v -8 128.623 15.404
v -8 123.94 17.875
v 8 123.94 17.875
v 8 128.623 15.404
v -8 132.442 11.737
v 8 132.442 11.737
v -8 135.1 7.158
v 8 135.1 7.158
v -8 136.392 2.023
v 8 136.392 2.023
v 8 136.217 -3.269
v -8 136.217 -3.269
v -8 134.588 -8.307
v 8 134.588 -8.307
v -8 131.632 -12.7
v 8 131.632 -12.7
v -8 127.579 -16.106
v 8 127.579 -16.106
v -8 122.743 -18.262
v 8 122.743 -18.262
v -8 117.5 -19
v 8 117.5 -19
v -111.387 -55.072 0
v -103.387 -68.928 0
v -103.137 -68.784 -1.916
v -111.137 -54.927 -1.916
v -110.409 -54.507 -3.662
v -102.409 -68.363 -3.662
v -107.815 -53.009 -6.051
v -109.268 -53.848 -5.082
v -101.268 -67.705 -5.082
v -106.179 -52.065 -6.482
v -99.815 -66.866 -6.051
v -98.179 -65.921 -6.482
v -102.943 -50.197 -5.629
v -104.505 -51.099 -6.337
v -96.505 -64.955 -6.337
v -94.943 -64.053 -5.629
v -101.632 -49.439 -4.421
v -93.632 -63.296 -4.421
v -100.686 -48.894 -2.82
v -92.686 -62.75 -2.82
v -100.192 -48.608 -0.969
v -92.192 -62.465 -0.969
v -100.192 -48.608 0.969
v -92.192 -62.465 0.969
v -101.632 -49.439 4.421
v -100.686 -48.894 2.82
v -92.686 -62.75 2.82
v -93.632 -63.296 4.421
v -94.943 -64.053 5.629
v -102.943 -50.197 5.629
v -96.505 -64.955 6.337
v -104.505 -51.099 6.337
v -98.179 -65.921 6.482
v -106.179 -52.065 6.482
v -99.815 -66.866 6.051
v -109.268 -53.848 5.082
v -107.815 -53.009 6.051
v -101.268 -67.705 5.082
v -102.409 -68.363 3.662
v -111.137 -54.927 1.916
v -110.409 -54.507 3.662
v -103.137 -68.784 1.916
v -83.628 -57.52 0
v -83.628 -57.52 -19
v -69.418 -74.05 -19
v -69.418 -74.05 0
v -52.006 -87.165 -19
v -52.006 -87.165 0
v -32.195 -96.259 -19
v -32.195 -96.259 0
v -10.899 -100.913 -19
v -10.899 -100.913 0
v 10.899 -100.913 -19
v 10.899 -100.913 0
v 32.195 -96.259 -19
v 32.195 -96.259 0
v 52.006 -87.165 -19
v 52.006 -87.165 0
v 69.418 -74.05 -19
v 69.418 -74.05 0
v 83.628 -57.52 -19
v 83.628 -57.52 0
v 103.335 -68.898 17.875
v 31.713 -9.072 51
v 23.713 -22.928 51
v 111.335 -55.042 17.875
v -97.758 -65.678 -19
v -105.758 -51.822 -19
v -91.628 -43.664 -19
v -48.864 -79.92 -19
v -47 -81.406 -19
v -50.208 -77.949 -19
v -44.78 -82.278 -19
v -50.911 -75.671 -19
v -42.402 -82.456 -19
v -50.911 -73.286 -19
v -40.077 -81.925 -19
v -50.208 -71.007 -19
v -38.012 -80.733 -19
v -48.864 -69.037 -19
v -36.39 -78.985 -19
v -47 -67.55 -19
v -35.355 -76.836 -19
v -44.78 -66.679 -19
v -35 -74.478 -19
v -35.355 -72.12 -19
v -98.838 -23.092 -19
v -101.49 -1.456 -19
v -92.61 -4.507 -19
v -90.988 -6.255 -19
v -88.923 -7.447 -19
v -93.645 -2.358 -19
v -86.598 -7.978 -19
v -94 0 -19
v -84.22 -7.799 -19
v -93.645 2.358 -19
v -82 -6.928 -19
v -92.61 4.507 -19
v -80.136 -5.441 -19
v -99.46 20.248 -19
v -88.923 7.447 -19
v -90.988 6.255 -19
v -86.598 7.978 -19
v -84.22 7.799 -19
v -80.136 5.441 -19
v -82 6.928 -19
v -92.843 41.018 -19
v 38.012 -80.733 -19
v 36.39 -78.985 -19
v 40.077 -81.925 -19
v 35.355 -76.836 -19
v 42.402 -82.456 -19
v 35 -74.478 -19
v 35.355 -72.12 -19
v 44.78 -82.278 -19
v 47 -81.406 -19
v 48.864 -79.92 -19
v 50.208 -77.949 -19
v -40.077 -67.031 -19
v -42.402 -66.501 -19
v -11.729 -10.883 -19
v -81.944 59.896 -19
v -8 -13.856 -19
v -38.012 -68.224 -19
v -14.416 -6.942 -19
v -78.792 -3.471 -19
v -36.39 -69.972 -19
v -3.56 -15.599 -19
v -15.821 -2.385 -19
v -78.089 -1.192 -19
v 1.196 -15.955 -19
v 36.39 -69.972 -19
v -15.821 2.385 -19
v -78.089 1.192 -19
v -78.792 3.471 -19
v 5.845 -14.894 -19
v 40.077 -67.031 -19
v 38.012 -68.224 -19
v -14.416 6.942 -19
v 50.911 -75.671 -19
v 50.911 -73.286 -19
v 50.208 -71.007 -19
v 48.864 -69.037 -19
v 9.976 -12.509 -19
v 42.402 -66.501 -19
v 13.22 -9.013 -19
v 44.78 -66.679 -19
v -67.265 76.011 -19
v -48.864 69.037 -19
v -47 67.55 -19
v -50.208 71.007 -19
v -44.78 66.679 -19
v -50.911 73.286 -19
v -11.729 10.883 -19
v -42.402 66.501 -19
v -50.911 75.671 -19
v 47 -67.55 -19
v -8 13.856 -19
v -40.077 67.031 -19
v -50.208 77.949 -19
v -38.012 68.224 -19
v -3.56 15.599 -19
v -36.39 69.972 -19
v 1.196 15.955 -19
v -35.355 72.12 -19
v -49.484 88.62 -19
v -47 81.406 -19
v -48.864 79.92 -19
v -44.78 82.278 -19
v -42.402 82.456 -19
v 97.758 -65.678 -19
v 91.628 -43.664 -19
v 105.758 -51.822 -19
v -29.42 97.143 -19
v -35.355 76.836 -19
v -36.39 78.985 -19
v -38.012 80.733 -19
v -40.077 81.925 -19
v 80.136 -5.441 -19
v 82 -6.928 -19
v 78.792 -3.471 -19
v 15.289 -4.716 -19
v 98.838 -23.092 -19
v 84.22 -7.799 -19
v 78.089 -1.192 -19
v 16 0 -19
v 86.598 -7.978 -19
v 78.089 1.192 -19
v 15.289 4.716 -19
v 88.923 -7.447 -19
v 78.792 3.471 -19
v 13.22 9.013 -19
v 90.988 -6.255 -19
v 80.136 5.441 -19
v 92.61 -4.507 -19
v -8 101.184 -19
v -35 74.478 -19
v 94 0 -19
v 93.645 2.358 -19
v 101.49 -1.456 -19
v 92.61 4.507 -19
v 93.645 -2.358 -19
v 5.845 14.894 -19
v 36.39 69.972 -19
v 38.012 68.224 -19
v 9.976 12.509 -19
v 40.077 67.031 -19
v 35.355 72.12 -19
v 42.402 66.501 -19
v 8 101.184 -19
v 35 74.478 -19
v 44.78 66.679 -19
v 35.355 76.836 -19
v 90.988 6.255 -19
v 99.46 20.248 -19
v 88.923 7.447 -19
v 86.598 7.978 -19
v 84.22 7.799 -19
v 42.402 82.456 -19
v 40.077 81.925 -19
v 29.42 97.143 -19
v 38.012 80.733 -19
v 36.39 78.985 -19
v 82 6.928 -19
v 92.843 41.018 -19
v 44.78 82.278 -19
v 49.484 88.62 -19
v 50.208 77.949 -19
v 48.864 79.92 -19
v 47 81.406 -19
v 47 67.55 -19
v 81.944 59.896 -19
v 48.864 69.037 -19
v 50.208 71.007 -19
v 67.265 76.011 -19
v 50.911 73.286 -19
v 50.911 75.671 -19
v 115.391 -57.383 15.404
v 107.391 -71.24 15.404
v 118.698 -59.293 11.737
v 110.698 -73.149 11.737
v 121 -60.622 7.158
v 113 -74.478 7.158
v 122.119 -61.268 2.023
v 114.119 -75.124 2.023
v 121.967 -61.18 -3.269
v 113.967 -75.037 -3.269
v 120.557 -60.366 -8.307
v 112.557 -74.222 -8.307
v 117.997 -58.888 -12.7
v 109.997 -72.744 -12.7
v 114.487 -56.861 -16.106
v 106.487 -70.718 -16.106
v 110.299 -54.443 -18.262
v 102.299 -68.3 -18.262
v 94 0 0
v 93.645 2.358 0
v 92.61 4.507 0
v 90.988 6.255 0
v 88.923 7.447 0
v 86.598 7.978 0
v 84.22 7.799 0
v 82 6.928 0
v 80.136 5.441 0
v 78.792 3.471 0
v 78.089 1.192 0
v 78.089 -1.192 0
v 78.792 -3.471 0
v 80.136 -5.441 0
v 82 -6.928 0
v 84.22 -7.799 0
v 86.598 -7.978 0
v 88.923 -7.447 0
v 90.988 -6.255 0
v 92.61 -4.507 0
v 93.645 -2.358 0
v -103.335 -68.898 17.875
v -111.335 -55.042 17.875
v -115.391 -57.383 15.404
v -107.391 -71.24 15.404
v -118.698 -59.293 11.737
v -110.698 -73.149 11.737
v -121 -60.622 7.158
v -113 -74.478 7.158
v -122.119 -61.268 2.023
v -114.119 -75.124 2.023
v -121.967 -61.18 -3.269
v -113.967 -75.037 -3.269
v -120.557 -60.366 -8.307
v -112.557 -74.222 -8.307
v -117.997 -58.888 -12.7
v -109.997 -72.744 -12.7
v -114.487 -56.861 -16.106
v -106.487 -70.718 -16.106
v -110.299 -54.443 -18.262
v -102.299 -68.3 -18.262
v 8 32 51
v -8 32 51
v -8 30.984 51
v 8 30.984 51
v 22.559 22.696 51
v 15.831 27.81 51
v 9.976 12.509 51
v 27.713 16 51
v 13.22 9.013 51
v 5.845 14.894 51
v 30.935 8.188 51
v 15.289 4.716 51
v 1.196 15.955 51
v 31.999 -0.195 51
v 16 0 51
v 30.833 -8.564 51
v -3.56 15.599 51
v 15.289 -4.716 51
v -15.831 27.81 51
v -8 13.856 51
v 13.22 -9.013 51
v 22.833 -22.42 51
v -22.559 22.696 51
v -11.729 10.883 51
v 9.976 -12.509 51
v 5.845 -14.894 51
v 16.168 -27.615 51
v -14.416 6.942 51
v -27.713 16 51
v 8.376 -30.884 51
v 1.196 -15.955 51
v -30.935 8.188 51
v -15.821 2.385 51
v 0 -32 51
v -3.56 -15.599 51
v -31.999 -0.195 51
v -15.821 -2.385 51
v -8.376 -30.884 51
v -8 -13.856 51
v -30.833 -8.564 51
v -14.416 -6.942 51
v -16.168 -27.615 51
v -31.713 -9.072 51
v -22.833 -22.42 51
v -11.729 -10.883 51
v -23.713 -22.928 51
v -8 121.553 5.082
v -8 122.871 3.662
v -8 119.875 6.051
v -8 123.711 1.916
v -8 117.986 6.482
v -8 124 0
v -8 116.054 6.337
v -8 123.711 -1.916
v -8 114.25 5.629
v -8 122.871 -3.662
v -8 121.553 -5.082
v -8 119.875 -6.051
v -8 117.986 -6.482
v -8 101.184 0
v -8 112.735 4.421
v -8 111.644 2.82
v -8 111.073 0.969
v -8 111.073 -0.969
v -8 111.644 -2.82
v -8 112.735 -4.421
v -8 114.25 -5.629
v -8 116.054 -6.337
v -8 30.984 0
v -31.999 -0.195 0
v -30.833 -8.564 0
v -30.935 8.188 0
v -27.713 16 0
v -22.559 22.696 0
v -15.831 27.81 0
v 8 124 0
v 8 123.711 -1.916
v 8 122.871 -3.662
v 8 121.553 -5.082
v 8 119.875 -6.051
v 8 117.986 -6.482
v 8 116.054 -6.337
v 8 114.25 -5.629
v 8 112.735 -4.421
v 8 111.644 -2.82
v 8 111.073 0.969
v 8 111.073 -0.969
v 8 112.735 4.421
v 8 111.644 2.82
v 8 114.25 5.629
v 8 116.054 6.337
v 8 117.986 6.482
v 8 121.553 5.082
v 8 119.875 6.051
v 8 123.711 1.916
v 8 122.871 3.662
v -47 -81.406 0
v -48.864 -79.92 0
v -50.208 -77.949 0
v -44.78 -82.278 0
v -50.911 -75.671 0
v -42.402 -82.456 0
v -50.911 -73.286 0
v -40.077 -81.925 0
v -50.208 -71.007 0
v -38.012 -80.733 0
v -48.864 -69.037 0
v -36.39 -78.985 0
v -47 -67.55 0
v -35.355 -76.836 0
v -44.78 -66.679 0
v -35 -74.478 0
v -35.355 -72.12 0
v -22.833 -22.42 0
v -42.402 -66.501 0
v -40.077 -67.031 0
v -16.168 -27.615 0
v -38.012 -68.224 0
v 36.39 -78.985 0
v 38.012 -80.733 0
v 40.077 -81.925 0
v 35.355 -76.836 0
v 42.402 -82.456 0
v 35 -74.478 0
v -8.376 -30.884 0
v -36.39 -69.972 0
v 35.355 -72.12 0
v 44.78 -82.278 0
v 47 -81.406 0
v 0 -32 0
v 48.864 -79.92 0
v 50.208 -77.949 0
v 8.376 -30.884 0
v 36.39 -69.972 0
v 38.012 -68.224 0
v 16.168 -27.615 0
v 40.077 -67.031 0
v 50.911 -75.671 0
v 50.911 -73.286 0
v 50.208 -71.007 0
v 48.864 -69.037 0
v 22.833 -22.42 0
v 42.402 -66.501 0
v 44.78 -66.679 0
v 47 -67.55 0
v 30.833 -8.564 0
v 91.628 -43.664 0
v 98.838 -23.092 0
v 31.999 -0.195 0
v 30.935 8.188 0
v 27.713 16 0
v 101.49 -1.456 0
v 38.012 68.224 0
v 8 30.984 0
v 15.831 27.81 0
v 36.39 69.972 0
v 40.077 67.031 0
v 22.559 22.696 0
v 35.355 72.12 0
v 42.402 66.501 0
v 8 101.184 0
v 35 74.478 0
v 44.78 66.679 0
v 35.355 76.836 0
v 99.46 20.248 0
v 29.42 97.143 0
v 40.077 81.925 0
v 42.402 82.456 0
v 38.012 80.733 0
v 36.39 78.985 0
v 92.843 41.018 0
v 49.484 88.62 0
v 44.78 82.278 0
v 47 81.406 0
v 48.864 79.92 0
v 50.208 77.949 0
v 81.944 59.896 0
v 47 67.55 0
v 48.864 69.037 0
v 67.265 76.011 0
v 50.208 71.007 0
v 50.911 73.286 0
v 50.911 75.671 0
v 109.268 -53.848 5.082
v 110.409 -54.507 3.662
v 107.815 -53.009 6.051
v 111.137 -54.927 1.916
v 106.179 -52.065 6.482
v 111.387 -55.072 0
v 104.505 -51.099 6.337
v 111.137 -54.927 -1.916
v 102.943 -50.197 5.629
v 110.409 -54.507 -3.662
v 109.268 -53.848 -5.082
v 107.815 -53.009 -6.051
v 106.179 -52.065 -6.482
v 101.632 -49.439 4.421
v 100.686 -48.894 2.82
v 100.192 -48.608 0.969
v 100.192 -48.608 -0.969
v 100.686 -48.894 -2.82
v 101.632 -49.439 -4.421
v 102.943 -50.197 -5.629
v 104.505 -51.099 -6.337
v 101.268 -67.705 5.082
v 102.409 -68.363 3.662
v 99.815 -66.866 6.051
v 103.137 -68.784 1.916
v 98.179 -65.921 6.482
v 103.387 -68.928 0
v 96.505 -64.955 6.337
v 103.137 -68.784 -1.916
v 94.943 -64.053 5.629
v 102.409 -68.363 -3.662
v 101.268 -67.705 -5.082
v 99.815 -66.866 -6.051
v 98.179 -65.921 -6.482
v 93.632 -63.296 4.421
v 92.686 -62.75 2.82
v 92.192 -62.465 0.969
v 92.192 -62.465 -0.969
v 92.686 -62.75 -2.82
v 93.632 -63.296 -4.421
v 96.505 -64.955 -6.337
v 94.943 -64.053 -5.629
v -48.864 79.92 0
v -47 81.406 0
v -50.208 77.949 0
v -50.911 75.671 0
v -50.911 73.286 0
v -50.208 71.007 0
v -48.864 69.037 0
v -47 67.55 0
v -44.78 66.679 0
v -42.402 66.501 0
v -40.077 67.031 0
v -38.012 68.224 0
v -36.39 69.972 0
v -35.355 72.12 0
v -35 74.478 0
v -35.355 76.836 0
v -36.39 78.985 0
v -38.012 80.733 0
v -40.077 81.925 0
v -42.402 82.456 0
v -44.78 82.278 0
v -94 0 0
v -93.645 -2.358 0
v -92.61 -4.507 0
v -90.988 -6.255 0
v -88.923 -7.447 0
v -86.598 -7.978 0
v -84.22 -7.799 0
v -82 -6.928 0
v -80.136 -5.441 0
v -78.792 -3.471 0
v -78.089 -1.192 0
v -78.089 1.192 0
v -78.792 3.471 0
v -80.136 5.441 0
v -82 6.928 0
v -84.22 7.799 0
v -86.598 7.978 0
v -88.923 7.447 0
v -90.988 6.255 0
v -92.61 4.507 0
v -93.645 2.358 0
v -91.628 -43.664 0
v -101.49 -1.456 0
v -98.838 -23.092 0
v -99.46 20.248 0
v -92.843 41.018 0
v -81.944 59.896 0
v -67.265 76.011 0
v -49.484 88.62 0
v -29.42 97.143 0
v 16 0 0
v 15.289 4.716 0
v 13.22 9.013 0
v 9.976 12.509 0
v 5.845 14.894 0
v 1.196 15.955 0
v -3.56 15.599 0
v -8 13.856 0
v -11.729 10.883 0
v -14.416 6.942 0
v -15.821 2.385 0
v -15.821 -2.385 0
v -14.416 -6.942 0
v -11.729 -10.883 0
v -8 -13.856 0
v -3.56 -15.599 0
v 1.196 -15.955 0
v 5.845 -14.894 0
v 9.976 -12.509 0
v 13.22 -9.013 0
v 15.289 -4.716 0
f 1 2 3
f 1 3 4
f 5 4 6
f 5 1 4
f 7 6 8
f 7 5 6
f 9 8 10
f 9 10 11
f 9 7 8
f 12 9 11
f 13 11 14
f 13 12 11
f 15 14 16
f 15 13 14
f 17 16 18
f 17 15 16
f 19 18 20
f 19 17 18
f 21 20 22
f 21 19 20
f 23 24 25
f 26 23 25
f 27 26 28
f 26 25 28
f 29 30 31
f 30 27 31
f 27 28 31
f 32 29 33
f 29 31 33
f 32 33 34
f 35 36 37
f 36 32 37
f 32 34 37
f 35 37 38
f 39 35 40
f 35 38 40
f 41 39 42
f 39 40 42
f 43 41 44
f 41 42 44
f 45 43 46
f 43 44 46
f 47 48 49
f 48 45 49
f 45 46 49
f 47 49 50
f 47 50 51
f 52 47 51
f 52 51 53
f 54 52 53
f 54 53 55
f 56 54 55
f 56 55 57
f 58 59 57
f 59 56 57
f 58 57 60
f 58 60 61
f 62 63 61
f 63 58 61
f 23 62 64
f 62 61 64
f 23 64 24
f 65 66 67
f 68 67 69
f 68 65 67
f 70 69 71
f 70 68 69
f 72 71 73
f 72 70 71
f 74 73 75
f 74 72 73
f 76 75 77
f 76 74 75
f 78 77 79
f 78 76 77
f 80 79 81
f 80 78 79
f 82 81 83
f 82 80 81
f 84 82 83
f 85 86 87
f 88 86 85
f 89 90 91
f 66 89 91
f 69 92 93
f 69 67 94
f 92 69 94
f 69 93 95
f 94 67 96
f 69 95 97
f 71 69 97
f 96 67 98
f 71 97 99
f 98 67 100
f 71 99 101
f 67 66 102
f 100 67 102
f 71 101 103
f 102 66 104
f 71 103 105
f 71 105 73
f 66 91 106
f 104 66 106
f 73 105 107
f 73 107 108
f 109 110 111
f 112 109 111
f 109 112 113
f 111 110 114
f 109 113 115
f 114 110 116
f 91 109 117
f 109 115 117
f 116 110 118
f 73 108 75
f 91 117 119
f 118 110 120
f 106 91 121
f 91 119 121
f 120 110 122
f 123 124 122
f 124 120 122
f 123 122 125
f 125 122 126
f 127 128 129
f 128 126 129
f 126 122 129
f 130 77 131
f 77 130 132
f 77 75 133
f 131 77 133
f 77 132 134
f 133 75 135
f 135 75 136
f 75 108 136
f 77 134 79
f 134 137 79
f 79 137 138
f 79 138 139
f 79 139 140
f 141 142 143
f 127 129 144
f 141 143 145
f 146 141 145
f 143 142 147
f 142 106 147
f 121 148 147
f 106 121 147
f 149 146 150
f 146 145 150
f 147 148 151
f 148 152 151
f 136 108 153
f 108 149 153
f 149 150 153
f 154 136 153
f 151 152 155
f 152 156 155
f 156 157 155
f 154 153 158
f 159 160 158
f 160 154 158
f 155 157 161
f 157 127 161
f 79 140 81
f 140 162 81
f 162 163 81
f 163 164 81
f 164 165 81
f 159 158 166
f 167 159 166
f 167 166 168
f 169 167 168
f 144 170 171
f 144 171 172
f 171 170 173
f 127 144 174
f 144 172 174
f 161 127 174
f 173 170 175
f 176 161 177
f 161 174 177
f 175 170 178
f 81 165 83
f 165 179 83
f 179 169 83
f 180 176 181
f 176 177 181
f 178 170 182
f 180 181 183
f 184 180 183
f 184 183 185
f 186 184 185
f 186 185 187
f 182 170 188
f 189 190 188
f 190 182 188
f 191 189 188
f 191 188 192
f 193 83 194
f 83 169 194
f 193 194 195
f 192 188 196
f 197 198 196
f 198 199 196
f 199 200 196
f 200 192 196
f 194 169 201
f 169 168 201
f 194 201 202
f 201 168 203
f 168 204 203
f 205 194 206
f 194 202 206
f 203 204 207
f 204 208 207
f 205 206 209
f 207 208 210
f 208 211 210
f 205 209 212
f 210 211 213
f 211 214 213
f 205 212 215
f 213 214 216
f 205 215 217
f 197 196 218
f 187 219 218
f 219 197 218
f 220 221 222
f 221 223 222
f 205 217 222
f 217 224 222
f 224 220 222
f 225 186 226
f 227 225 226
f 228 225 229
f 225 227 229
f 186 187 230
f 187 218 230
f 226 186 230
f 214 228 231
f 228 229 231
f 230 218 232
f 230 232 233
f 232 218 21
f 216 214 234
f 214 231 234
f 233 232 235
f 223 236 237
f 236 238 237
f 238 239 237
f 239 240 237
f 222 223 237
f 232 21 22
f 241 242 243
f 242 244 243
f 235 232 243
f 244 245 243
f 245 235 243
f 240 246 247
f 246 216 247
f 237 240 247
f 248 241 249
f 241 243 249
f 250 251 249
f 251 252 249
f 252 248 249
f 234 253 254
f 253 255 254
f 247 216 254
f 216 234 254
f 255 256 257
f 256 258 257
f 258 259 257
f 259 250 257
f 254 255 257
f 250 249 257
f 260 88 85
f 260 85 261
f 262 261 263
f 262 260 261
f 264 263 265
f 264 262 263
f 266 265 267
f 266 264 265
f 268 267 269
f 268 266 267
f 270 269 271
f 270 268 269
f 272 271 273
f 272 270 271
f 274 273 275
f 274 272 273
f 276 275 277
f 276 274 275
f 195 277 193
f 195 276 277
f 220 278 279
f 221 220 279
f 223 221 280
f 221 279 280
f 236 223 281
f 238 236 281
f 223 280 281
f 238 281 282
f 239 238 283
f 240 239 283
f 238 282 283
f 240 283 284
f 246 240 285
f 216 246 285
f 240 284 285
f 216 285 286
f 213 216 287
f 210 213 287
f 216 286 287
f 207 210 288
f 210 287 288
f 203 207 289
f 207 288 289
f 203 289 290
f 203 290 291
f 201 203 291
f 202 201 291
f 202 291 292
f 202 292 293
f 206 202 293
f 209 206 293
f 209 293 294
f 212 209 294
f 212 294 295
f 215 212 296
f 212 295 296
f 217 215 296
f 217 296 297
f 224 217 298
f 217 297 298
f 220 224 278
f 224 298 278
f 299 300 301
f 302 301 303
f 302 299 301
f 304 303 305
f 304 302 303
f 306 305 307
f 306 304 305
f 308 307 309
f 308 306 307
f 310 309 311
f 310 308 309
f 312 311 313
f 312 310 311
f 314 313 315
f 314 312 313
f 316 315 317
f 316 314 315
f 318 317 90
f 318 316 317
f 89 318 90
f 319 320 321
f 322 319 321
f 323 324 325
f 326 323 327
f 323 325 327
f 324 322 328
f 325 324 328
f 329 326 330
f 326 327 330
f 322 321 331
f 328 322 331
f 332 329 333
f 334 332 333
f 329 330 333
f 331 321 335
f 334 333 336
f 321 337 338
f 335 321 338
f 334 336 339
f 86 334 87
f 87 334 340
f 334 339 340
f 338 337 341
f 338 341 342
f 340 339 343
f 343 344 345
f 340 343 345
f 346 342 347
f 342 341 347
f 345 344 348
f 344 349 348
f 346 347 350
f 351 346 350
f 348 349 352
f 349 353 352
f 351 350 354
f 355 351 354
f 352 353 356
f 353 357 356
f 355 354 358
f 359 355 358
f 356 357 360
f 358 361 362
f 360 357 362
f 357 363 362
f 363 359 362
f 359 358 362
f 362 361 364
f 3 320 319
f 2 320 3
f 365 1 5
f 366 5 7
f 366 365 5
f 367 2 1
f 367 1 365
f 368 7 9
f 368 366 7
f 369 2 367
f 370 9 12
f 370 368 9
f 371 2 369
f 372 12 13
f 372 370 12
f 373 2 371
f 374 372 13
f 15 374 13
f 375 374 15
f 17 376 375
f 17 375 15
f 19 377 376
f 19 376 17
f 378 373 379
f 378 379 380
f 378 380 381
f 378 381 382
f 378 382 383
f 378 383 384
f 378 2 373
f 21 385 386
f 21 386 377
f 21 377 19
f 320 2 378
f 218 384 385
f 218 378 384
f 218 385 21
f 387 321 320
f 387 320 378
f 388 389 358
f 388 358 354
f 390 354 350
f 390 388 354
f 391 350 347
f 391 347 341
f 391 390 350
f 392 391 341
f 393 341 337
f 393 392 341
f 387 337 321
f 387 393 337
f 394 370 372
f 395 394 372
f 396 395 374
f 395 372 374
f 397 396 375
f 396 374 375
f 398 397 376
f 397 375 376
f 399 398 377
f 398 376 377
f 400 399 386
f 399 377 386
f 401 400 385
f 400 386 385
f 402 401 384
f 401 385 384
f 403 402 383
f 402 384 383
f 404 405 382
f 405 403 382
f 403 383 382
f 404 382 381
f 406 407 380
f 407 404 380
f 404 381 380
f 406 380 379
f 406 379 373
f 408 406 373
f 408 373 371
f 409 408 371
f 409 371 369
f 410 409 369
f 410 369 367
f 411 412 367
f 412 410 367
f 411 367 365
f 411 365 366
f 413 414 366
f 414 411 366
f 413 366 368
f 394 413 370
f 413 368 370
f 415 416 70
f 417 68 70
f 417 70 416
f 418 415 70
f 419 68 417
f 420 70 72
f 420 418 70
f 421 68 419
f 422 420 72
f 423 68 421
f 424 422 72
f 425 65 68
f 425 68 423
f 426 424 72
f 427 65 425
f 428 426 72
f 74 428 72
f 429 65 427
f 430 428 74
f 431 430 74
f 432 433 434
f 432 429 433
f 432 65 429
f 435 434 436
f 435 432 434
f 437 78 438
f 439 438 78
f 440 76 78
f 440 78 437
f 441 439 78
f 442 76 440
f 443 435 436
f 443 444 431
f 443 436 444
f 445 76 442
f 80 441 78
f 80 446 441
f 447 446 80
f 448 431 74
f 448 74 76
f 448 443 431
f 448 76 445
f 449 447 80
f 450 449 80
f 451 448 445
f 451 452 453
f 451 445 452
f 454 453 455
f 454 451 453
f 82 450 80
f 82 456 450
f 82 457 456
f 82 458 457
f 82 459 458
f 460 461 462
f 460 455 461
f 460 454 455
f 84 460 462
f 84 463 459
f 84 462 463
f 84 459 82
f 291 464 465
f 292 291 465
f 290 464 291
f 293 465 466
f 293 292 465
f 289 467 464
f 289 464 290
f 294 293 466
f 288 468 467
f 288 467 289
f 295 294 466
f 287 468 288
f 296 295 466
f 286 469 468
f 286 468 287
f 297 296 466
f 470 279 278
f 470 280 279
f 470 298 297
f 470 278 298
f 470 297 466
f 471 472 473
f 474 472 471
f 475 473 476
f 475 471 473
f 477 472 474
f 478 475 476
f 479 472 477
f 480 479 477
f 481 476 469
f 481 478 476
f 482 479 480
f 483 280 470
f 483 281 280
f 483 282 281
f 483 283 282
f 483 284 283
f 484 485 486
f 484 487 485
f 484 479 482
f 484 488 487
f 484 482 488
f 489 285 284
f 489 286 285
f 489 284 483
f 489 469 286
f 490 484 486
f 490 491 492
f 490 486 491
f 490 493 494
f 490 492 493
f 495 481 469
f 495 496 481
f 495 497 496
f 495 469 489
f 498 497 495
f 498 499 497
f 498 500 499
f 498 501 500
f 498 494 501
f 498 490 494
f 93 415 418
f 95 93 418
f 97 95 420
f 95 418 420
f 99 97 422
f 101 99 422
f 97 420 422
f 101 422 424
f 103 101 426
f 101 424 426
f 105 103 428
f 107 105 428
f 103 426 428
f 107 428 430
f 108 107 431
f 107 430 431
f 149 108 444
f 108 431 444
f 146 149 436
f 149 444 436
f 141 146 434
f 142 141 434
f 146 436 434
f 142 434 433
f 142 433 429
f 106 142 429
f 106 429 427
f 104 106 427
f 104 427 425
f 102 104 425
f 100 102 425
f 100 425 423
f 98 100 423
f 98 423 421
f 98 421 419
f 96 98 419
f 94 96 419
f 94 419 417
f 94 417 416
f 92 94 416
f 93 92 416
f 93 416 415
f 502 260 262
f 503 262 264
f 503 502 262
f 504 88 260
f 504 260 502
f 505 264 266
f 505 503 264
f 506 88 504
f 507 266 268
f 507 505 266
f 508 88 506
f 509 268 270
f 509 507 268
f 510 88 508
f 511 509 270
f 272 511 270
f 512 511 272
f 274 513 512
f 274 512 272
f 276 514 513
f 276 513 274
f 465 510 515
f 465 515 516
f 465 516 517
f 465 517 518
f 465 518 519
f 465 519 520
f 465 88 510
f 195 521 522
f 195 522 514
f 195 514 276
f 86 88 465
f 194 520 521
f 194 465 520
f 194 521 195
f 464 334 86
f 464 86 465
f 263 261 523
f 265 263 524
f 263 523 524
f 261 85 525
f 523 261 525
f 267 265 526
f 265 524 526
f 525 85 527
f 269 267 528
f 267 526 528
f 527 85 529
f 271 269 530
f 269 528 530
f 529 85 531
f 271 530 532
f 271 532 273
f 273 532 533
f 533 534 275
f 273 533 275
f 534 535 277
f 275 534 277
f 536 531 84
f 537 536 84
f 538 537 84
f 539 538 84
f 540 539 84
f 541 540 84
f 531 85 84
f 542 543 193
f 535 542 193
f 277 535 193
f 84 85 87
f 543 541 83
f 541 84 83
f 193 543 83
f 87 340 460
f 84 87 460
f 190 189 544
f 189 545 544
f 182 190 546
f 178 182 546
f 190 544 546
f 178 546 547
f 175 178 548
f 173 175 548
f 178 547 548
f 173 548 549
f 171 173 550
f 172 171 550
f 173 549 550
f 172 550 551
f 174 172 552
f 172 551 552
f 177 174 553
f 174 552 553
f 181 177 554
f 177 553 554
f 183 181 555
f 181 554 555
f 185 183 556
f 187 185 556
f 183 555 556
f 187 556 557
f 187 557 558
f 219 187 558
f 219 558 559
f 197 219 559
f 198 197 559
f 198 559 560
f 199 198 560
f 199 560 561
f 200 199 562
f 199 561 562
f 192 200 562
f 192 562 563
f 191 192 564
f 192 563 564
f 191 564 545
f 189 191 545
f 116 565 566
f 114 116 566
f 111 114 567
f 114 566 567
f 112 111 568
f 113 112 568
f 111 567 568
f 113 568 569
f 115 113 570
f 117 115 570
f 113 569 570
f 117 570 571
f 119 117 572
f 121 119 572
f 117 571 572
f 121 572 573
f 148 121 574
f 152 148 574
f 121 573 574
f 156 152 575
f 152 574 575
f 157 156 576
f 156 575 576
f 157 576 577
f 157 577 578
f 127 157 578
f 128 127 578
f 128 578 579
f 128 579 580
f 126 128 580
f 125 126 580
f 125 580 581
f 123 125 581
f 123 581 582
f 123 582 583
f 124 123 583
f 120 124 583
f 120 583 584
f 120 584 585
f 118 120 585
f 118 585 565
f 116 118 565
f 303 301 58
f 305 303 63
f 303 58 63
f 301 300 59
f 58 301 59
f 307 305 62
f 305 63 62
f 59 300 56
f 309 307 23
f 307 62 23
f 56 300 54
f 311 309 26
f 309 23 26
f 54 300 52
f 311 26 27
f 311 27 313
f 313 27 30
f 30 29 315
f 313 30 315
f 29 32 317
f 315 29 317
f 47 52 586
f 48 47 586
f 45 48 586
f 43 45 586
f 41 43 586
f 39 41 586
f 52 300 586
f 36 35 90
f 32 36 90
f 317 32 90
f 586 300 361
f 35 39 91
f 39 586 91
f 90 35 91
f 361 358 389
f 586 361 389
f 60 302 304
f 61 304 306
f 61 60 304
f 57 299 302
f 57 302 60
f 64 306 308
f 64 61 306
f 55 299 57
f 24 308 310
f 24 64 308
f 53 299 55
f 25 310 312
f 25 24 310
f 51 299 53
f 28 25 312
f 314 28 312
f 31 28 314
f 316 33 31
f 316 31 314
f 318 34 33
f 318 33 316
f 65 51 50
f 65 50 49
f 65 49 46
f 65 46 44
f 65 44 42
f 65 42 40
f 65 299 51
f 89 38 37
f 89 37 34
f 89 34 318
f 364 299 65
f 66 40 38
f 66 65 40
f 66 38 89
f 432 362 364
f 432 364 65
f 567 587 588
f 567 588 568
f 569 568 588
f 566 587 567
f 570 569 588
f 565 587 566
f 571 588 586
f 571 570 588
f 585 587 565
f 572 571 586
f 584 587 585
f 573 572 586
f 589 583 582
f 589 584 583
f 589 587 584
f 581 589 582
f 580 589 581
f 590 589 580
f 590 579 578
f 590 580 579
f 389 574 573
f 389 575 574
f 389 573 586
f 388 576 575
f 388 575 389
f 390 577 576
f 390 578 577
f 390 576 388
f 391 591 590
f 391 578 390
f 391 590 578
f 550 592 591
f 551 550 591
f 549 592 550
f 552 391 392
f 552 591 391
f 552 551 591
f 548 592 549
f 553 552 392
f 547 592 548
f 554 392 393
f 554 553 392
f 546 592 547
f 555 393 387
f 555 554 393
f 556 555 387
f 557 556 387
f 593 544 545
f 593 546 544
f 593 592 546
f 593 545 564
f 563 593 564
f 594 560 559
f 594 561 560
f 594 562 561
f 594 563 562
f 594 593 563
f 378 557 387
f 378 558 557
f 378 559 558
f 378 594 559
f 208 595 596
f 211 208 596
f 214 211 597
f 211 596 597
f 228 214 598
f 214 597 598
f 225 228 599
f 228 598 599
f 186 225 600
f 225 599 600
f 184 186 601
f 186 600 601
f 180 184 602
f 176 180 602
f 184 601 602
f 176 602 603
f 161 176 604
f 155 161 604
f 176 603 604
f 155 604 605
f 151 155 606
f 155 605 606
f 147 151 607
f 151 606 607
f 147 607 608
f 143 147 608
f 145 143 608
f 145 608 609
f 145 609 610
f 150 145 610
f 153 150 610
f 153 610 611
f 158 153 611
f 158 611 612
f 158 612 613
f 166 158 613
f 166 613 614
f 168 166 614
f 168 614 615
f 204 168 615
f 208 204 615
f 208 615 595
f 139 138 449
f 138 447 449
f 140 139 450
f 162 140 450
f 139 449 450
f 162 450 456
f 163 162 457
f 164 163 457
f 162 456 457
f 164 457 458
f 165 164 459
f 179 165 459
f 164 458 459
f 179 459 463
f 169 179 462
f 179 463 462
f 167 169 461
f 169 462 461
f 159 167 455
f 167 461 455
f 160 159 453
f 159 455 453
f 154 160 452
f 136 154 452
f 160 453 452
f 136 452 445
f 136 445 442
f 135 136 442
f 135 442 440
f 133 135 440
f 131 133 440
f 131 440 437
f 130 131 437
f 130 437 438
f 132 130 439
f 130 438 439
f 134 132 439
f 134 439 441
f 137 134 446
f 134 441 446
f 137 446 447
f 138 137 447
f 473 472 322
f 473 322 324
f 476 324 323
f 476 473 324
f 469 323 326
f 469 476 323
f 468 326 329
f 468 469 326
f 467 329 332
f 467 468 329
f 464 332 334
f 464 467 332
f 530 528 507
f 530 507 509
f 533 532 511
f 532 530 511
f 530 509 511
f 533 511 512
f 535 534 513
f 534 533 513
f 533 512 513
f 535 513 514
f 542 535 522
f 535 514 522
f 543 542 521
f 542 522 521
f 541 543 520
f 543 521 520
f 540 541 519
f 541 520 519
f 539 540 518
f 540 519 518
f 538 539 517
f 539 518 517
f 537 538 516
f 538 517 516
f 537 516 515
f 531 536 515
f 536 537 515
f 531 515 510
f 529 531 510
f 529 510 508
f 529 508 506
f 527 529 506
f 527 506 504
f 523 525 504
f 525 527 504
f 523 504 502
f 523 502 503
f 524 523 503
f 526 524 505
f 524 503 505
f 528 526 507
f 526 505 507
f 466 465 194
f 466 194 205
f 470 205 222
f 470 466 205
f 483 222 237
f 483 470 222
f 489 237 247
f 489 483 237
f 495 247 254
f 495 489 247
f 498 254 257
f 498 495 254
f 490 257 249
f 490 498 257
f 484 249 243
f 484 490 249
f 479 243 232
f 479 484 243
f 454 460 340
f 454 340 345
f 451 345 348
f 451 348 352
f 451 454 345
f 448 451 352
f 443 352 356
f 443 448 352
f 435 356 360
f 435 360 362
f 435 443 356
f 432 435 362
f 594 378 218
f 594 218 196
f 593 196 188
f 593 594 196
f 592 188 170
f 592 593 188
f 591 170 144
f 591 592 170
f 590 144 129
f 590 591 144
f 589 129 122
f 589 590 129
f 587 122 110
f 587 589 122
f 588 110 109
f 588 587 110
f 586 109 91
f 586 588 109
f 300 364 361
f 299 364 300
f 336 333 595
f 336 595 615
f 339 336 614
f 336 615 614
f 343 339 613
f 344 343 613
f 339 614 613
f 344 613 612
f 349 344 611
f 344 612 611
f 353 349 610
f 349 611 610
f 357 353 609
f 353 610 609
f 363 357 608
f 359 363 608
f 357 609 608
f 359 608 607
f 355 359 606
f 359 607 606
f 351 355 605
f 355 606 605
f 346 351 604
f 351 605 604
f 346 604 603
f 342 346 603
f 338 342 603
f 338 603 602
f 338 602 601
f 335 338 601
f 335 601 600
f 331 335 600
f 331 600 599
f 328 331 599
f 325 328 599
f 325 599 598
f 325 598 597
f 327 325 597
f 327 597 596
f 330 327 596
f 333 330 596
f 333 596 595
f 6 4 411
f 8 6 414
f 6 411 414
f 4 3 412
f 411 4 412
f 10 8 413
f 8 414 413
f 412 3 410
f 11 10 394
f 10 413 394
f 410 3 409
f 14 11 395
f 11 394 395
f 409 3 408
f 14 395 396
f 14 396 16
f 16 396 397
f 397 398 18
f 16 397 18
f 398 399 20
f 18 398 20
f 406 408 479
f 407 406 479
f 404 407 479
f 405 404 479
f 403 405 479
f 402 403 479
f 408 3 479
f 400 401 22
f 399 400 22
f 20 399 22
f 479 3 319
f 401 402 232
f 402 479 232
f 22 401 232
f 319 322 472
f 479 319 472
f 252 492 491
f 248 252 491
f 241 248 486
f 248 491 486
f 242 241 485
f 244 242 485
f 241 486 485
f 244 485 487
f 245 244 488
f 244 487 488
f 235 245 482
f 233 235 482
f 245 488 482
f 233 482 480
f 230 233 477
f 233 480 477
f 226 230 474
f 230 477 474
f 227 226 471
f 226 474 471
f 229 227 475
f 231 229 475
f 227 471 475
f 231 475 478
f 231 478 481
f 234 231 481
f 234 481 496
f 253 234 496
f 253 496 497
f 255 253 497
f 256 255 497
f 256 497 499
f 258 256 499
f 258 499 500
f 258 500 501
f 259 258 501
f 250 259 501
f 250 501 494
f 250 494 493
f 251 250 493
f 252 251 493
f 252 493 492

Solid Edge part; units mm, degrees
sketch "Sketch1" plane through (0, 0, 0) normal (0, 0, 1) x (1, 0, 0)
  circle A0 centre (0, 0) radius 101.5
extrude "Protrusion1" add sketch "Sketch1" against normal blind 19
sketch "Sketch2" plane through (0, 0, 0) normal (0, 0, 1) x (1, 0, 0)
  circle A0 centre (0, 0) radius 32
  circle A1 centre (0, 0) radius 16
extrude "ExtrudedProtrusion_2" add sketch "Sketch2" along normal blind 51
sketch "Sketch3" plane through (0, 0, 0) normal (0, 0, 1) x (1, 0, 0)
  circle A0 centre (86, 0) radius 8
extrude "Cutout1" cut sketch "Sketch3" against normal up to vertex (19 mm away)
pattern_circular "Pattern1" count 6 over 360 about axis through (0, 0, 0) along (0, 0, 1) of "Cutout1"
sketch "Sketch4" plane through (0, 0, 0) normal (1, 0, 0) x (0, 1, 0)
  line L0 (32, 51) -> (123.9402, 17.8752)
  line L1 (101.5, -19) -> (117.5, -19)
  line L2 (16, -19) -> (101.5, -19)
  line L3 (16, 0) -> (16, -19)
  line L4 (16, 51) -> (16, 0)
  line L5 (32, 51) -> (16, 51)
  arc A0 (123.9402, 17.8752) -> (117.5, -19) centre (117.5, 0) cw
  circle A1 centre (117.5, 0) radius 6.5
extrude "ExtrudedProtrusion_6" add sketch "Sketch4" along normal mid plane 16
pattern_circular "Pattern3" count 3 over 360 about axis through (0, 0, 0) along (0, 0, 1) of "ExtrudedProtrusion_6"
sketch "Sketch5" plane through (0, 0, 0) normal (0, 0, 1) x (1, 0, 0)
  circle A0 centre (0, 0) radius 16
extrude "ExtrudedCutout_2" cut sketch "Sketch5" against normal blind 19
